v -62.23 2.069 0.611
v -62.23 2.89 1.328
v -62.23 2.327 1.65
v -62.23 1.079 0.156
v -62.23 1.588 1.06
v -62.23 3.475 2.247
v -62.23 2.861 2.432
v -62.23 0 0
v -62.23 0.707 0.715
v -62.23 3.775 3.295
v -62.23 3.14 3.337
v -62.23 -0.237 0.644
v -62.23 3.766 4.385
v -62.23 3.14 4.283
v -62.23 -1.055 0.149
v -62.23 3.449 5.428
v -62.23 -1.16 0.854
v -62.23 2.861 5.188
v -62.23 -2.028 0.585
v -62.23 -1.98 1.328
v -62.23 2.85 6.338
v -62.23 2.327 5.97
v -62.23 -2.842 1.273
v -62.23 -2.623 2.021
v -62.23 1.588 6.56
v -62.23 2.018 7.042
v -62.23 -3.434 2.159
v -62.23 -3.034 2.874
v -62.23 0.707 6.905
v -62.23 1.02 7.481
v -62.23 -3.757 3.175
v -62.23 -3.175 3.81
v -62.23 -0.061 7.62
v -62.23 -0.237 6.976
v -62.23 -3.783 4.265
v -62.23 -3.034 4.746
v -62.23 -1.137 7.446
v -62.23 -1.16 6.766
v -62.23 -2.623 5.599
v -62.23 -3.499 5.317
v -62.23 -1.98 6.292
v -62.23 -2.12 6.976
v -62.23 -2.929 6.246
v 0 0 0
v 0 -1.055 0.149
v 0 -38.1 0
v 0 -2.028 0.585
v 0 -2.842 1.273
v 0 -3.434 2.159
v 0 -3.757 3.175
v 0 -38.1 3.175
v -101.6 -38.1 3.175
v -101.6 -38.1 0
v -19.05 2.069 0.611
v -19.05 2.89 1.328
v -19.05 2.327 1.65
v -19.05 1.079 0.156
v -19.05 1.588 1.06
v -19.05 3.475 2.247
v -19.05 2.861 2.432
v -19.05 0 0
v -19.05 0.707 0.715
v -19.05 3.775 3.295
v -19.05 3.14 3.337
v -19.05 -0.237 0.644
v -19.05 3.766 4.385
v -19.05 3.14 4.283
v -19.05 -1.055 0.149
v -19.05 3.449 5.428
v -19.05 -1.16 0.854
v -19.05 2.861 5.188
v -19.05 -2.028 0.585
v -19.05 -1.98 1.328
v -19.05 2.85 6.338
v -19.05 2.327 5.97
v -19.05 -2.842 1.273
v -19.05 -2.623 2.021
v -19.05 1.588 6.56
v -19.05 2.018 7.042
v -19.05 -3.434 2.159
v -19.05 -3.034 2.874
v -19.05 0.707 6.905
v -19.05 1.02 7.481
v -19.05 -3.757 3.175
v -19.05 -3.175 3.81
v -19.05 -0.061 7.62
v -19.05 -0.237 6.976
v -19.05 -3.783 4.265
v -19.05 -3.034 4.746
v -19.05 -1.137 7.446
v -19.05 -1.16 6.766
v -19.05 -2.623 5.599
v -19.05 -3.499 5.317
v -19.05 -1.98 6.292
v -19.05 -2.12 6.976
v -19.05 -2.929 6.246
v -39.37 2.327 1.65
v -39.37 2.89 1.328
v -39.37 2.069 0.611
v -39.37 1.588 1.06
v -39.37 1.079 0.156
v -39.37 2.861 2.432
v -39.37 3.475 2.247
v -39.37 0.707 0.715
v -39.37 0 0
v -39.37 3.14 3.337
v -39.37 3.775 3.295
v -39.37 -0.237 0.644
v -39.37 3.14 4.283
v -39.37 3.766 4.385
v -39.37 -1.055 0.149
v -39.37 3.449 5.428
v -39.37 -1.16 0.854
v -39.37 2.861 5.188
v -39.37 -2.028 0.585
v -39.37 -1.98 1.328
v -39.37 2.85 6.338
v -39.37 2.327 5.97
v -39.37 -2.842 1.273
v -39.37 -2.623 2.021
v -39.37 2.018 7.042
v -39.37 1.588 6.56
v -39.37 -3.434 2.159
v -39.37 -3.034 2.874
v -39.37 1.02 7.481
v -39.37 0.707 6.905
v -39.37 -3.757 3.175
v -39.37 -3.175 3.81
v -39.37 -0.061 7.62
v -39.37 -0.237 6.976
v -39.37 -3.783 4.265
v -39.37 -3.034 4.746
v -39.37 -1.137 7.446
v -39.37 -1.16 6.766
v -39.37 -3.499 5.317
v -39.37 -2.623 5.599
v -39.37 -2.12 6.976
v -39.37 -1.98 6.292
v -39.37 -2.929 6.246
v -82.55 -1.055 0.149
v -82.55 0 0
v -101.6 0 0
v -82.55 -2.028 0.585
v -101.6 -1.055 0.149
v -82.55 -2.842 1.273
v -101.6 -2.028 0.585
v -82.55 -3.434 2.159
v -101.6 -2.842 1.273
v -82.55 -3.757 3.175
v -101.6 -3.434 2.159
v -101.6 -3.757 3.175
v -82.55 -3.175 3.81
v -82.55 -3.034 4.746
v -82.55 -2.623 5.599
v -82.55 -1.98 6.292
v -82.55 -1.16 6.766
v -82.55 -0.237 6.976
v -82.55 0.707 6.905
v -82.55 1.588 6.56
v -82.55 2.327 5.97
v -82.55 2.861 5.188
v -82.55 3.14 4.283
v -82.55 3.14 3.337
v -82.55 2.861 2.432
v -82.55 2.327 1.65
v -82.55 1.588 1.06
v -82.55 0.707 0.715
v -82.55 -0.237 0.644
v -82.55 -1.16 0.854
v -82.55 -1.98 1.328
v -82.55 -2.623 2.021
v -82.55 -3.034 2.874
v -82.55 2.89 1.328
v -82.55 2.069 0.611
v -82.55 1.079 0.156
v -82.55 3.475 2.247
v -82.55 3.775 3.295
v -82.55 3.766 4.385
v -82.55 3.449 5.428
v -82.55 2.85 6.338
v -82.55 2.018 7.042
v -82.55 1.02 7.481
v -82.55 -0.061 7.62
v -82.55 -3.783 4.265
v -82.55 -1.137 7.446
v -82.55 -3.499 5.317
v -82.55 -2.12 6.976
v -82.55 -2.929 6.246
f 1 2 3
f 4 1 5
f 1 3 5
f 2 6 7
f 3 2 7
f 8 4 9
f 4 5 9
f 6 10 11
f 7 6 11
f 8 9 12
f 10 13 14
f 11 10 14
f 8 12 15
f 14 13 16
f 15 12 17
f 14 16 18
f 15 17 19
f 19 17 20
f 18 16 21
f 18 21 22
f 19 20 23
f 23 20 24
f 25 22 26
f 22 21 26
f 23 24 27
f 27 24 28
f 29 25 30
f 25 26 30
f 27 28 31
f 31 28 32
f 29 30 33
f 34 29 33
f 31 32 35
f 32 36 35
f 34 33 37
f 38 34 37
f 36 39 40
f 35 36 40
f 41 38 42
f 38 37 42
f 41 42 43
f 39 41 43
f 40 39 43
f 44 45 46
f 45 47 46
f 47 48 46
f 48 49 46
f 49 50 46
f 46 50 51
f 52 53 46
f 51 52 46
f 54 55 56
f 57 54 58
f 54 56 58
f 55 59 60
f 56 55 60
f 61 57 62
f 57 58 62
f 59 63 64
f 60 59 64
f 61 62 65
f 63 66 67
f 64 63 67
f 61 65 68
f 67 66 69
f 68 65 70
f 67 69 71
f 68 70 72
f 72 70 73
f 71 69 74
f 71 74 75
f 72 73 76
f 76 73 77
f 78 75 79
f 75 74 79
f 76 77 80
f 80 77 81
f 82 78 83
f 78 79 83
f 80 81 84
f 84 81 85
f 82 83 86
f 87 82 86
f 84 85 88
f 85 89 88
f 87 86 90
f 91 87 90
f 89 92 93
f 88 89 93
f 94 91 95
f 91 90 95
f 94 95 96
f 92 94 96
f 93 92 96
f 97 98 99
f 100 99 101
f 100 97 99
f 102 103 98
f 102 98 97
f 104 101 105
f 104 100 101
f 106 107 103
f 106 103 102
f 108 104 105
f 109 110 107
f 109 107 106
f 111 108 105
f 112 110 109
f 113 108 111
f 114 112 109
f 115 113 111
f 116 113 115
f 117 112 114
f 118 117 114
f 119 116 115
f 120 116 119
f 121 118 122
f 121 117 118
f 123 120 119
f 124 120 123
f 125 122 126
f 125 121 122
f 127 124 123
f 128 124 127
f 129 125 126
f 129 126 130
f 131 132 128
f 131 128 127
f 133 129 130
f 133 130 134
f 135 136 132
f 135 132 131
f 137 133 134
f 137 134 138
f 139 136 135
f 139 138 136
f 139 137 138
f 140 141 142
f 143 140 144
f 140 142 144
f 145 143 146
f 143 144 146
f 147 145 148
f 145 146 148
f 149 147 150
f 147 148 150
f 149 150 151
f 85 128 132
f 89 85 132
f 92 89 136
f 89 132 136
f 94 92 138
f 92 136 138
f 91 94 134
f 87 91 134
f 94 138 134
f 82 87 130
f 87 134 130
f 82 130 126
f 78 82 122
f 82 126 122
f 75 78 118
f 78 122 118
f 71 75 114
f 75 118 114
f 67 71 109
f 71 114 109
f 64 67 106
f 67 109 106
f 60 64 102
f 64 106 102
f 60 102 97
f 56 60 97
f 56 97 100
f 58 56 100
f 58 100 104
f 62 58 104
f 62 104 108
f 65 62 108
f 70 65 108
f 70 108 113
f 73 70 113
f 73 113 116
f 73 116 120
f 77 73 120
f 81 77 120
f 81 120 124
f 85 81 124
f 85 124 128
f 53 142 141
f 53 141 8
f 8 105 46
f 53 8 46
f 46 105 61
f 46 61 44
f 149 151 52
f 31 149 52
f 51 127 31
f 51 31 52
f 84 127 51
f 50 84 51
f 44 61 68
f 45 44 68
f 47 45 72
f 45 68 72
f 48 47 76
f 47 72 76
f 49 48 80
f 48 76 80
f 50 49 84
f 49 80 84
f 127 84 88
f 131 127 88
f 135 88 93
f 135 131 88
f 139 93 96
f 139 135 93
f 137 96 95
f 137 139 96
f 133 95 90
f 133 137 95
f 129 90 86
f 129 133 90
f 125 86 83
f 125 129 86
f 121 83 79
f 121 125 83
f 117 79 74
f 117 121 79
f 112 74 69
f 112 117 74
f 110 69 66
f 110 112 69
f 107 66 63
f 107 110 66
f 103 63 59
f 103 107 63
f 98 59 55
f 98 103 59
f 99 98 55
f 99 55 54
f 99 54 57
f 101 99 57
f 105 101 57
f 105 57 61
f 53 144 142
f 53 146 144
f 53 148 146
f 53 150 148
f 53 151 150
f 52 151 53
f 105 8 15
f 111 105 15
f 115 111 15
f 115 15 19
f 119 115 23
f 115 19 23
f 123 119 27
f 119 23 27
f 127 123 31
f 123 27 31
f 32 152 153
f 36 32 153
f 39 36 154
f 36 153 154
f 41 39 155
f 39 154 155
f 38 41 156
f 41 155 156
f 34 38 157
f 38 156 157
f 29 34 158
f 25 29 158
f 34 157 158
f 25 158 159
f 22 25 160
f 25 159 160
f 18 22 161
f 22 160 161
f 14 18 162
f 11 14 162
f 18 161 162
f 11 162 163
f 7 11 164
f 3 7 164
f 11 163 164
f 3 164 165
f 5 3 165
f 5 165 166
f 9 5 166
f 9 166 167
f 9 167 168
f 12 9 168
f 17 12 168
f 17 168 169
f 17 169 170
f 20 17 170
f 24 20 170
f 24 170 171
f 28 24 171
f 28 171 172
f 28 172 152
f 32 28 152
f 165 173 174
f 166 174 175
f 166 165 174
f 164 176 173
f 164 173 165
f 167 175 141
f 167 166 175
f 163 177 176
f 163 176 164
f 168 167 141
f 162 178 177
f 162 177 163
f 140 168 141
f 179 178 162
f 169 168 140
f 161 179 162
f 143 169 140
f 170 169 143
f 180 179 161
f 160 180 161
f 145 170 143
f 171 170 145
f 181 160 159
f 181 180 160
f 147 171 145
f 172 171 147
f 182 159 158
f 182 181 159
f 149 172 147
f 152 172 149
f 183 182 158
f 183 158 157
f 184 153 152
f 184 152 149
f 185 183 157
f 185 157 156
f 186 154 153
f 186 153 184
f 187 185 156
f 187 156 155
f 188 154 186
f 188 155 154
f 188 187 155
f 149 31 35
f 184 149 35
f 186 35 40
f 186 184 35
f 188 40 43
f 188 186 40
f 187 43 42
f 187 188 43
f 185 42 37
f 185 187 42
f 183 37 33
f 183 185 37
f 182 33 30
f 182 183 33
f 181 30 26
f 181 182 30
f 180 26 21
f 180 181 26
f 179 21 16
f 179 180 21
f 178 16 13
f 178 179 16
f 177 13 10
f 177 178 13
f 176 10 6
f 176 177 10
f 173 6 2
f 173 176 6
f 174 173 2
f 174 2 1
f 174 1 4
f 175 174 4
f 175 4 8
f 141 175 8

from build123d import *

# Parameters (mm, degrees)
F0_W     = 101.6
F0_H     = 38.1
F1_DEPTH = 3.175
F3_DEPTH = 254
F2_R     = 3.81
F2_R_2   = 3.175
F4_DEPTH = 101.6
F5_DEPTH = 19.05
F6_START = -39.37
F6_DEPTH = 22.86
F7_START = -82.55
F7_DEPTH = 19.05


with BuildPart() as f1:
    # F0 (on Top) → F1 (new body)
    with BuildSketch(Plane.XY):
        with Locations((-50.8, -19.05)):
            Rectangle(F0_W, F0_H)
    extrude(amount=F1_DEPTH)

    # F2 (on face) → F3 (cut)
    with BuildSketch(Plane(origin=(-101.6, 0, 0), x_dir=(0, -1, 0), z_dir=(-1, 0, 0))):
        with BuildLine():
            ThreePointArc((3.7567106623, 3.175), (3.7966542918, 3.4913839483), (3.81, 3.81))
            ThreePointArc((3.81, 3.81), (-2.6940768363, 6.5040768363), (0, 0))
            Line((0, 0), (0, 0.635))
            ThreePointArc((0, 0.635), (-2.2450640303, 6.0550640303), (3.175, 3.81))
            ThreePointArc((3.175, 3.81), (3.1589222858, 3.4908840456), (3.1108519733, 3.175))
            Line((3.1108519733, 3.175), (3.7567106623, 3.175))
        make_face()
        with BuildLine():
            Line((0, 0.635), (0, 0))
            ThreePointArc((0, 0), (2.4593444248, 0.9000644337), (3.7567106623, 3.175))
            Line((3.7567106623, 3.175), (3.1108519733, 3.175))
            ThreePointArc((3.1108519733, 3.175), (2.0080463142, 1.3506555752), (0, 0.635))
        make_face()
        with BuildLine():
            Line((0, 3.175), (0, 0.635))
            ThreePointArc((0, 0.635), (2.0080463142, 1.3506555752), (3.1108519733, 3.175))
            Line((3.1108519733, 3.175), (0, 3.175))
        make_face()
    extrude(amount=-F3_DEPTH, mode=Mode.SUBTRACT)

    # F2 (on face) → F4 (join, through all)
    with BuildSketch(Plane(origin=(-101.6, 0, 0), x_dir=(0, -1, 0), z_dir=(-1, 0, 0))):
        with Locations((0, 3.81)):
            Circle(F2_R)
        with Locations((0, 3.81)):
            Circle(F2_R_2, mode=Mode.SUBTRACT)
    extrude(amount=-F4_DEPTH)

    # F2 (on face) → F5 (cut)
    with BuildSketch(Plane(origin=(-101.6, 0, 0), x_dir=(0, -1, 0), z_dir=(-1, 0, 0))):
        with Locations((0, 3.81)):
            Circle(F2_R)
        with Locations((0, 3.81)):
            Circle(F2_R_2, mode=Mode.SUBTRACT)
    extrude(amount=-F5_DEPTH, mode=Mode.SUBTRACT)

    # F2 (on face) → F6 (cut)
    with BuildSketch(Plane(origin=(-101.6, 0, 0), x_dir=(0, -1, 0), z_dir=(-1, 0, 0)).offset(F6_START)):
        with Locations((0, 3.81)):
            Circle(F2_R)
        with Locations((0, 3.81)):
            Circle(F2_R_2, mode=Mode.SUBTRACT)
    extrude(amount=-F6_DEPTH, mode=Mode.SUBTRACT)

    # F2 (on face) → F7 (cut)
    with BuildSketch(Plane(origin=(-101.6, 0, 0), x_dir=(0, -1, 0), z_dir=(-1, 0, 0)).offset(F7_START)):
        with Locations((0, 3.81)):
            Circle(F2_R)
        with Locations((0, 3.81)):
            Circle(F2_R_2, mode=Mode.SUBTRACT)
    extrude(amount=-F7_DEPTH, mode=Mode.SUBTRACT)


solid = f1.part
